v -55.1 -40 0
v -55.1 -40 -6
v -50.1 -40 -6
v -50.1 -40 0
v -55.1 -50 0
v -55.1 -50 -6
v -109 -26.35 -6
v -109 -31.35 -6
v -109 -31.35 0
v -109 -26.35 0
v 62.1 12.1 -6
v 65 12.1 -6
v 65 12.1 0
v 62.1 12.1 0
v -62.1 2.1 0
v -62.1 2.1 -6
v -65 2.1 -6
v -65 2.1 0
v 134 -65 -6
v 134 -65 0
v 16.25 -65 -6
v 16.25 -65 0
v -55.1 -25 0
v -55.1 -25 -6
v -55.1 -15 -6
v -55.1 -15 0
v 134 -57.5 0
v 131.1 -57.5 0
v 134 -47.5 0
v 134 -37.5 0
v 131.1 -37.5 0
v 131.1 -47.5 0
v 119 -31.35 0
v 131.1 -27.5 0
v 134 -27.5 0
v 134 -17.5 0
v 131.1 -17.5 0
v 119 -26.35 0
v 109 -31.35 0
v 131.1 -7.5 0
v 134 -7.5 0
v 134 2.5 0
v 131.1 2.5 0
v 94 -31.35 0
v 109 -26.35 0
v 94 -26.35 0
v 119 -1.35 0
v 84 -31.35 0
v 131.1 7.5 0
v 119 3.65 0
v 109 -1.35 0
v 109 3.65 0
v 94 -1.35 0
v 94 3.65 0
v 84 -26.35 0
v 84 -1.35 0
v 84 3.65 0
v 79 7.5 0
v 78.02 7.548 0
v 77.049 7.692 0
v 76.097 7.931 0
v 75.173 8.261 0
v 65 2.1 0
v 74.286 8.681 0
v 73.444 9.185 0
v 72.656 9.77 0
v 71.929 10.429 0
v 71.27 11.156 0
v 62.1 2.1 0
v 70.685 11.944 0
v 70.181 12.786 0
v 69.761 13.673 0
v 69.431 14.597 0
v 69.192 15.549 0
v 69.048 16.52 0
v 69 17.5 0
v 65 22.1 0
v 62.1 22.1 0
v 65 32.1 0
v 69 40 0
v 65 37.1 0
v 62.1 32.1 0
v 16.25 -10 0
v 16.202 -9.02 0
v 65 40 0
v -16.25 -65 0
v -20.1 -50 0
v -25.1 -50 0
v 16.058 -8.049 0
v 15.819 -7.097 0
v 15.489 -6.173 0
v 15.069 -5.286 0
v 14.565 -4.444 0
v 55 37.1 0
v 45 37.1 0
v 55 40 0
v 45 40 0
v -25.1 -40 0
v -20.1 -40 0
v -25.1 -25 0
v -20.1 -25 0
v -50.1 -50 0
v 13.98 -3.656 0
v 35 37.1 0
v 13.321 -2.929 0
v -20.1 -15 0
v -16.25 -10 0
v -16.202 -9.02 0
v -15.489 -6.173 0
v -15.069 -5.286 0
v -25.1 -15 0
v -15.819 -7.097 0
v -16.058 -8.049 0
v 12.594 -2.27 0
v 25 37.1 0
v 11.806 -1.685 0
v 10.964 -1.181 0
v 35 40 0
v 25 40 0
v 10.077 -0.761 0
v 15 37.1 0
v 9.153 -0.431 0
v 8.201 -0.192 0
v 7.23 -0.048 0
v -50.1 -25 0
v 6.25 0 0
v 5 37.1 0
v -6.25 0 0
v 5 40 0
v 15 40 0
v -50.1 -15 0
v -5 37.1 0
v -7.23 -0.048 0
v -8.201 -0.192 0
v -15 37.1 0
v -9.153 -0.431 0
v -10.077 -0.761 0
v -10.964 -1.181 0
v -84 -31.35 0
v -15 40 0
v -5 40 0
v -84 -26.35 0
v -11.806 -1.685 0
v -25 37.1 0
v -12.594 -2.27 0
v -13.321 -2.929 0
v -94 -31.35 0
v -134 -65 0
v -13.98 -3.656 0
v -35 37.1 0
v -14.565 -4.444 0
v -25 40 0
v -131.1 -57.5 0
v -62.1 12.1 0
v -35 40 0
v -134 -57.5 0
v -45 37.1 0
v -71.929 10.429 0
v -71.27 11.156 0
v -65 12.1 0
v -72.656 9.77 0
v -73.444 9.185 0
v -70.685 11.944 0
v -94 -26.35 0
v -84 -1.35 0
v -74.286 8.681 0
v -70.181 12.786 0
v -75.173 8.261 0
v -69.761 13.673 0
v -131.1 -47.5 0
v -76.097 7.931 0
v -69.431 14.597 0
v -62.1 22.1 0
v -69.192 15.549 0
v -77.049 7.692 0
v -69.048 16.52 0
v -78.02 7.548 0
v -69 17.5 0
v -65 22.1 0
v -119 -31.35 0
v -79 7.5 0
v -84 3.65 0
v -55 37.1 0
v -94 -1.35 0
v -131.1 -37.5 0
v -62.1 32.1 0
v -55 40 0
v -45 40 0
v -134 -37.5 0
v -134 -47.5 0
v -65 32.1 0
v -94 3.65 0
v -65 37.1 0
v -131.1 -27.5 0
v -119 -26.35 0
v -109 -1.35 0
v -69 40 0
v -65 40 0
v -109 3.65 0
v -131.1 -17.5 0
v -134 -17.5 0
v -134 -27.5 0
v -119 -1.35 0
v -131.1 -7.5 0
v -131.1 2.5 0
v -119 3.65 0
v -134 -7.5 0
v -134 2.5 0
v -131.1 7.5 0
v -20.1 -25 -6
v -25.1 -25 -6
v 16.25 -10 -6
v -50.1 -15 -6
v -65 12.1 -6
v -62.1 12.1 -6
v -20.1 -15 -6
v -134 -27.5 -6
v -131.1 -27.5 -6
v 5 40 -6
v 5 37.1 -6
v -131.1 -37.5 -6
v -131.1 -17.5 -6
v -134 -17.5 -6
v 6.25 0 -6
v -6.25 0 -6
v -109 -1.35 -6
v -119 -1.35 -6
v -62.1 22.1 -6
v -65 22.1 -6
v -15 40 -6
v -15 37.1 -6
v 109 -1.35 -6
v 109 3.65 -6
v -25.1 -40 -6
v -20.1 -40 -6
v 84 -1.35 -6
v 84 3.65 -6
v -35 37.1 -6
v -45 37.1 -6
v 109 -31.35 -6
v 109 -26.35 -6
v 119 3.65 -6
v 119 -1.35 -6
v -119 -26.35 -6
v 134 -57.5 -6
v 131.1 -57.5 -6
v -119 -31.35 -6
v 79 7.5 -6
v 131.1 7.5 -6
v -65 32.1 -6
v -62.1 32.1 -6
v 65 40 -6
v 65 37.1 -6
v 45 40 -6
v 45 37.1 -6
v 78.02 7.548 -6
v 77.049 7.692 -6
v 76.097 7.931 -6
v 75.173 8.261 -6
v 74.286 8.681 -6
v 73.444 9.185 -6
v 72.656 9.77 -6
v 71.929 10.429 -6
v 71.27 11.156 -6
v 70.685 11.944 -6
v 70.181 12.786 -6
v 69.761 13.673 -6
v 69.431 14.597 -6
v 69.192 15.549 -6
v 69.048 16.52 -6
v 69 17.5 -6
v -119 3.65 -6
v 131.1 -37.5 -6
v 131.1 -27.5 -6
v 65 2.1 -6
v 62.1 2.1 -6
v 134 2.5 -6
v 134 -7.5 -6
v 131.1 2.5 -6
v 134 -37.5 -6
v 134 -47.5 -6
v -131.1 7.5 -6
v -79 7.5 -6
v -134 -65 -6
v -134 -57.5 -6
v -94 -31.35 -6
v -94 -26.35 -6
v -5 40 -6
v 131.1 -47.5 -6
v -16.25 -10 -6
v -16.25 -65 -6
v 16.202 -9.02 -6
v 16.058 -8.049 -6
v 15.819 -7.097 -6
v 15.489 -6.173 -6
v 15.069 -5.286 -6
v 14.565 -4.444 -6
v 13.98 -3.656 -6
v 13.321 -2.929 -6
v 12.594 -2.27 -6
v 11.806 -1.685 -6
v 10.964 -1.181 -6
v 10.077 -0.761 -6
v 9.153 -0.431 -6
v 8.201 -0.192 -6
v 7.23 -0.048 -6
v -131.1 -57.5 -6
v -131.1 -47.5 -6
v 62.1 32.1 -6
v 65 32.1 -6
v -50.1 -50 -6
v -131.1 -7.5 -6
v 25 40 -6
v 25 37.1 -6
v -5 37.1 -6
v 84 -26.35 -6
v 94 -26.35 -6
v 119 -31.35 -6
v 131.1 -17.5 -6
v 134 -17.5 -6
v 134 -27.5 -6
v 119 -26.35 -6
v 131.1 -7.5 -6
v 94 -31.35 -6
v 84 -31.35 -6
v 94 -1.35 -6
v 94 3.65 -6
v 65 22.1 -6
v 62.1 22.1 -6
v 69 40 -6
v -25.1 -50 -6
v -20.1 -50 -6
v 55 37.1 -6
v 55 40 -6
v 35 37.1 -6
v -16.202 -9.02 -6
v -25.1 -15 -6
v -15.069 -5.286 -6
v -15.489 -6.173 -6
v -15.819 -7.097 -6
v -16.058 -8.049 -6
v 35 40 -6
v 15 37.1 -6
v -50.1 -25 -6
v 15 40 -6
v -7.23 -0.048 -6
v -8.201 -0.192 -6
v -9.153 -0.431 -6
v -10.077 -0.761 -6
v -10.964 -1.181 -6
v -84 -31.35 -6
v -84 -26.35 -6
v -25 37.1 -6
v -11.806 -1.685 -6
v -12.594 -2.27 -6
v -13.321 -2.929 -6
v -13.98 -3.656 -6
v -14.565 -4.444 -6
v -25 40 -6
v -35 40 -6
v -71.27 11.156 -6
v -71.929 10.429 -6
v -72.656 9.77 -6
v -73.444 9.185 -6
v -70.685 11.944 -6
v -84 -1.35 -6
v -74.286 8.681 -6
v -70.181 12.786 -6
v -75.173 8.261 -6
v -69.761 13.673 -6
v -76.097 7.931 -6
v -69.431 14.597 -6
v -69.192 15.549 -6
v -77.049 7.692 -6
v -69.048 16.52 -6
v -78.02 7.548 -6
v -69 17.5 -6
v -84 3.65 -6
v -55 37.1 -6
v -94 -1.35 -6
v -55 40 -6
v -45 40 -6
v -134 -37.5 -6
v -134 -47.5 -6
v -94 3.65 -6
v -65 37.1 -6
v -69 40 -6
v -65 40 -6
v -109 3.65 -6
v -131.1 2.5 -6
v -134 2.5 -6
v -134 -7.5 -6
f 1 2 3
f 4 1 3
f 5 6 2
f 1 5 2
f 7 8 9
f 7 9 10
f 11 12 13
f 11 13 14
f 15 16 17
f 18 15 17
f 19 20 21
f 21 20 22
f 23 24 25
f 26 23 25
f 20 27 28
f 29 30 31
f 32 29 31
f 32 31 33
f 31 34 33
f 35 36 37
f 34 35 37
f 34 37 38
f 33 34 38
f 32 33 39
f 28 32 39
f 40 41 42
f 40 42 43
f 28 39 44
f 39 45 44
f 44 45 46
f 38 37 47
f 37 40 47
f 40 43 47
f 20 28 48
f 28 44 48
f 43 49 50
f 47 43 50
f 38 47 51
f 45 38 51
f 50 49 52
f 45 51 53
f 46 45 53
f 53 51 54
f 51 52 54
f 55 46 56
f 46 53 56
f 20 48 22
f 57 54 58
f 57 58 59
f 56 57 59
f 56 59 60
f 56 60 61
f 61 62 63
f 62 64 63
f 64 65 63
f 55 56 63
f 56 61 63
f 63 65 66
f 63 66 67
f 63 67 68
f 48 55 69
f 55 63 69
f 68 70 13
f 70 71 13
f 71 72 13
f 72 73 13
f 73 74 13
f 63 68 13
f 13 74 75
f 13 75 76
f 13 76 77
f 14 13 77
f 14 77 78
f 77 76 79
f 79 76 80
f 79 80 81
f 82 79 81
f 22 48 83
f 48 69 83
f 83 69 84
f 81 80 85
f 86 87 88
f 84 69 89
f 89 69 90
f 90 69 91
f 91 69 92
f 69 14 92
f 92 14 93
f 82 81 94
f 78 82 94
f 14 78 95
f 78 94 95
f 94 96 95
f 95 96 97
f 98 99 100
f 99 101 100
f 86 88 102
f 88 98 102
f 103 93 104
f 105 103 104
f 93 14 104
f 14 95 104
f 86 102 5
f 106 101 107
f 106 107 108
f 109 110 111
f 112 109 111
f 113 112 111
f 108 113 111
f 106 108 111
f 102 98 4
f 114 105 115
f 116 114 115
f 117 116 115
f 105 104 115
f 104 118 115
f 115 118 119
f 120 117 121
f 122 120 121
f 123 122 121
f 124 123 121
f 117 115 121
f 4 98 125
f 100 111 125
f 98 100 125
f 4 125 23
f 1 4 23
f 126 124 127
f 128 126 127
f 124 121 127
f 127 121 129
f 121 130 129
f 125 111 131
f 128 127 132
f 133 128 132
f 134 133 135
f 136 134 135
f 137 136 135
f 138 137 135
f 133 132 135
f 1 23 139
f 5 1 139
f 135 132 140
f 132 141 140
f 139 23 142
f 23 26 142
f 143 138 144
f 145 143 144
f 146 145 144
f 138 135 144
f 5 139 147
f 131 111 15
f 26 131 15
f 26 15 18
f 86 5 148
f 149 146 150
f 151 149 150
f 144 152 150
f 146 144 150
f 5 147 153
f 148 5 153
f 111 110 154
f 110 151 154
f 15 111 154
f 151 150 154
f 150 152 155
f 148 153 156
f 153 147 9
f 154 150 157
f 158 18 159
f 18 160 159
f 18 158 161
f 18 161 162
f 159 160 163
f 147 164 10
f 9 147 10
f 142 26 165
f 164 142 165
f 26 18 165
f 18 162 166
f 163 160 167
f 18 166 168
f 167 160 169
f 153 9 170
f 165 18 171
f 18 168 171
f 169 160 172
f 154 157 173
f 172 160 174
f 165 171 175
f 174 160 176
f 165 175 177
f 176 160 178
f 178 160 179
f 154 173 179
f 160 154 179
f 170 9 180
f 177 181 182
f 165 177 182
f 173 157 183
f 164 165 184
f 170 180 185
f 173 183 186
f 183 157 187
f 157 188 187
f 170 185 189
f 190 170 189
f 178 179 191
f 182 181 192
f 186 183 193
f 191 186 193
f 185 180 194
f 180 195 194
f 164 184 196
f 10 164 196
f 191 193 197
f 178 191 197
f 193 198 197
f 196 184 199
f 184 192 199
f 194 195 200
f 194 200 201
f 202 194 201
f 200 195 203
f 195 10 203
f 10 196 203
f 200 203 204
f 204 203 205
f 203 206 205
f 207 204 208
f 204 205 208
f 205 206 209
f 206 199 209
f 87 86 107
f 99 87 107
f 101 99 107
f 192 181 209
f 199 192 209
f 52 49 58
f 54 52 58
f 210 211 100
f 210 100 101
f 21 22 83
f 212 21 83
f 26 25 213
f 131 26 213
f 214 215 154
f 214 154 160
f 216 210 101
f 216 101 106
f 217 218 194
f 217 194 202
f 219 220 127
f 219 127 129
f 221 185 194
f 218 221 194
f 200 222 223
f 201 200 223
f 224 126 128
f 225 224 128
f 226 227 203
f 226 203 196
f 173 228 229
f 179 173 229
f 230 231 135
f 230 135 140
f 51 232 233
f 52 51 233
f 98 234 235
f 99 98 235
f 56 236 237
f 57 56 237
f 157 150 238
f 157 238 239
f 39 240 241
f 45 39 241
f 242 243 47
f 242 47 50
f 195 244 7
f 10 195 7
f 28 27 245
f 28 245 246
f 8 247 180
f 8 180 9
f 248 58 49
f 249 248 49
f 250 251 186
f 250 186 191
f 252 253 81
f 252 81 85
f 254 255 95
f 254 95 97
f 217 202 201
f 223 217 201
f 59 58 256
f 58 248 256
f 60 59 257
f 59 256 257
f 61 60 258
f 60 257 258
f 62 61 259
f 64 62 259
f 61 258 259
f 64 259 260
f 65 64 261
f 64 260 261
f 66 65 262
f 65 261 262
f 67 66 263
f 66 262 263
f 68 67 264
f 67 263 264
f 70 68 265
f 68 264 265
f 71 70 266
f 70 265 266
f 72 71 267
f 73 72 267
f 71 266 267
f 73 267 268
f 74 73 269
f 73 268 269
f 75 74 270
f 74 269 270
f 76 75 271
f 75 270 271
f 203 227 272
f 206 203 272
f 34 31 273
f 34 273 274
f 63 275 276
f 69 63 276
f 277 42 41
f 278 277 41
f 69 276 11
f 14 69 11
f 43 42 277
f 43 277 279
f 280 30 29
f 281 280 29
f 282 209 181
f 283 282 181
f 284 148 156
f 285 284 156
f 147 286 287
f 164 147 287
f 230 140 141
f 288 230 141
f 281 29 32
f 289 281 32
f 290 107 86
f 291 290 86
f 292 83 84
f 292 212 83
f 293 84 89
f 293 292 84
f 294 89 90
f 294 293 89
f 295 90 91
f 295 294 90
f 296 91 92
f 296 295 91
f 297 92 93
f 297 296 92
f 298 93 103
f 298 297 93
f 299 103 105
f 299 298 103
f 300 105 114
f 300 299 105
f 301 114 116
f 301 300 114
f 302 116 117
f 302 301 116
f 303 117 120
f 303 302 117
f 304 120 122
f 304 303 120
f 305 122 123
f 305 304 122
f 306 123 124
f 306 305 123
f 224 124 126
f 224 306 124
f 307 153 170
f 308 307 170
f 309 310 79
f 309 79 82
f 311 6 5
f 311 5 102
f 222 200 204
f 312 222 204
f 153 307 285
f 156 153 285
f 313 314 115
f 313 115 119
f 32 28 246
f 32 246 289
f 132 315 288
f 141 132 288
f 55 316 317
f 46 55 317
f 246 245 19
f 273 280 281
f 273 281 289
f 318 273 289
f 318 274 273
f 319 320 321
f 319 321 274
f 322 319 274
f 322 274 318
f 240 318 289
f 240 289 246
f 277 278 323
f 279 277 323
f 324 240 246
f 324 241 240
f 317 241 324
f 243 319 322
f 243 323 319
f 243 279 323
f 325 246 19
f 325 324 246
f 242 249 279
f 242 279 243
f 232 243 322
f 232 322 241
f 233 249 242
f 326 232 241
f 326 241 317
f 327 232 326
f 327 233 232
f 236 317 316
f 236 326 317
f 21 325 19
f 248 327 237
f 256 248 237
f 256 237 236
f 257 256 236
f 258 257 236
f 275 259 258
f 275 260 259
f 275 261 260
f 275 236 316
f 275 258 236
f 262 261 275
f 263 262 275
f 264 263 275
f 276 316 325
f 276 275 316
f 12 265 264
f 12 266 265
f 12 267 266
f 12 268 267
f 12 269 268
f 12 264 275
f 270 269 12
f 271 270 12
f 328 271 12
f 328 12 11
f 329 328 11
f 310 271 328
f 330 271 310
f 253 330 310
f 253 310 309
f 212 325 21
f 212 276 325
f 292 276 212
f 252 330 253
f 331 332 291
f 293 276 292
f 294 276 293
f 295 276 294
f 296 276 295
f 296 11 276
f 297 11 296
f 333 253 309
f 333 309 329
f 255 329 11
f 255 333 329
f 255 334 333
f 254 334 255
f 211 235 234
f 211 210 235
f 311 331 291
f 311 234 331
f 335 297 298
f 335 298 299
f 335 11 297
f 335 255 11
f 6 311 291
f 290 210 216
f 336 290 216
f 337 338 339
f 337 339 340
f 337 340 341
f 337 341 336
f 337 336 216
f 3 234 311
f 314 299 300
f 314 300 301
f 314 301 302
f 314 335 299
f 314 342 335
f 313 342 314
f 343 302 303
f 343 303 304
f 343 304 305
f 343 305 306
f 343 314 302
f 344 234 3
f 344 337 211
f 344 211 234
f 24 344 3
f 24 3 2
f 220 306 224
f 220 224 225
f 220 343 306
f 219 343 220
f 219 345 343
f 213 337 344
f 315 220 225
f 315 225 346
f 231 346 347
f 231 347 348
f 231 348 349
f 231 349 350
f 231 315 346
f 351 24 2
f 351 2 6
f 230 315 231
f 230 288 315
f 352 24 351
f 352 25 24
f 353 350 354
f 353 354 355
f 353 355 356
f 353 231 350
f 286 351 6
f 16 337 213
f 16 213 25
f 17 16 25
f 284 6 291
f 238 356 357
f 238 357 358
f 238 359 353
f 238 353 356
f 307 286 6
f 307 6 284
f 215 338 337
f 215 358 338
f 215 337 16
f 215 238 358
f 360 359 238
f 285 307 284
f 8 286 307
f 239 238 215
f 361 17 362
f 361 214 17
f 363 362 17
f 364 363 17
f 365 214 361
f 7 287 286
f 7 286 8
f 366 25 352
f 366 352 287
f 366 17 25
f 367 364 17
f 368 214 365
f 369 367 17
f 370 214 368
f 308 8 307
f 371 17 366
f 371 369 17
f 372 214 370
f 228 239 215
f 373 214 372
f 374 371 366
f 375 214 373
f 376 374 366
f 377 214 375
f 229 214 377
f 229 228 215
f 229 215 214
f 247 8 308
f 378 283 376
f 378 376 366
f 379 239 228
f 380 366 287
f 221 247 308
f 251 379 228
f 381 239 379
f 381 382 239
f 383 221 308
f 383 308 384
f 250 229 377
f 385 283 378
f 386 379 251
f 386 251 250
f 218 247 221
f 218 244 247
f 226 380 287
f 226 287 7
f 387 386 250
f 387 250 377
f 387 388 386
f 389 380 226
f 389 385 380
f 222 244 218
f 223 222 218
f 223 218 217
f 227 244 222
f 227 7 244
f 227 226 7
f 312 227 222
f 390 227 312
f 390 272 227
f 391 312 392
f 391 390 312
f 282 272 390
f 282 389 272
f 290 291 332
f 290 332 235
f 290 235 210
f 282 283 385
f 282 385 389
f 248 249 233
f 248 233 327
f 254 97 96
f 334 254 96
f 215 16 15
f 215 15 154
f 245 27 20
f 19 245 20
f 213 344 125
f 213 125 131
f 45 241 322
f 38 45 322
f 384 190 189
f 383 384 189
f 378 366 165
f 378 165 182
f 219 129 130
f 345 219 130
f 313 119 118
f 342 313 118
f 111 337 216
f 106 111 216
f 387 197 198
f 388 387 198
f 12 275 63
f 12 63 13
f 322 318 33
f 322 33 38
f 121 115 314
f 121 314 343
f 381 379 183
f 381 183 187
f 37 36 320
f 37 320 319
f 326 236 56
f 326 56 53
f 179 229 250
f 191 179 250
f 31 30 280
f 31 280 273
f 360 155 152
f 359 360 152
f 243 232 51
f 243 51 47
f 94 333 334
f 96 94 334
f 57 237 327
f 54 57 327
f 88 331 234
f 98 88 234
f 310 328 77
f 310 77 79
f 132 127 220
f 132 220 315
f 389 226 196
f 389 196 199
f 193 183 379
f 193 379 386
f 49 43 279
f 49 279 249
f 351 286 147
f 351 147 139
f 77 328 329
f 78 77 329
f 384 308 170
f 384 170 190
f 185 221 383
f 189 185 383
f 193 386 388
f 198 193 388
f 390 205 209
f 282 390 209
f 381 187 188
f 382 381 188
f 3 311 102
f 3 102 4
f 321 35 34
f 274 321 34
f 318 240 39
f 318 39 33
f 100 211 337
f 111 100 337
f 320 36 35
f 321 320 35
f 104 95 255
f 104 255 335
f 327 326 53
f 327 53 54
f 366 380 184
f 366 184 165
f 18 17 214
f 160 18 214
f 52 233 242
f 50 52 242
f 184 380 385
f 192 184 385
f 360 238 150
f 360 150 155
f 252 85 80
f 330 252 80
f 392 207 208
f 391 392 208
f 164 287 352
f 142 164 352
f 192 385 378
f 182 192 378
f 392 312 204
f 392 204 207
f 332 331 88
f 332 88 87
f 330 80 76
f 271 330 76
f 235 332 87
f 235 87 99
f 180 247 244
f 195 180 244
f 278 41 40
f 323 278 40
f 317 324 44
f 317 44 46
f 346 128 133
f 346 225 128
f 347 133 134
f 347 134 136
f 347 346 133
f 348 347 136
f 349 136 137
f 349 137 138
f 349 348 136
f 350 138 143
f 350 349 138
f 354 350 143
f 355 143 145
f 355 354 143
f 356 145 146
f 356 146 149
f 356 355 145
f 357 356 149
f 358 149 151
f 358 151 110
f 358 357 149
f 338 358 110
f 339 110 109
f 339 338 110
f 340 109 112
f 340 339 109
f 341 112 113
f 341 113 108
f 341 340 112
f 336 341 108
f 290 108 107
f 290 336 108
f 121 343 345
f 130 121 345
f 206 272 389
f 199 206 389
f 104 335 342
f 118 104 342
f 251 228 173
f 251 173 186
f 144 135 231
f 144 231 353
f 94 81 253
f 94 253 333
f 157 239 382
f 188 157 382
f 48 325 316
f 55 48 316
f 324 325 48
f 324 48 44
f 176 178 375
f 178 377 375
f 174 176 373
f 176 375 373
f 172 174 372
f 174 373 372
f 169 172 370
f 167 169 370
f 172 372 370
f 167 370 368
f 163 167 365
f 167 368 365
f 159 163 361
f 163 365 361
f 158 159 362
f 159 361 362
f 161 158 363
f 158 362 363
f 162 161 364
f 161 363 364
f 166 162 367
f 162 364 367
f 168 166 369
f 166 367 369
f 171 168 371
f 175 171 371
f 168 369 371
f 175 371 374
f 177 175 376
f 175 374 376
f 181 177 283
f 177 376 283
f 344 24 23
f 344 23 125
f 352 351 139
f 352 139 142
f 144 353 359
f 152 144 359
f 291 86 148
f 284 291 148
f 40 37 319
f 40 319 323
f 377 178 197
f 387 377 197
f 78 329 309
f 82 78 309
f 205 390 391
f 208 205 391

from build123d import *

# Parameters (mm, degrees)
BOSS_EXTRUDE1_DEPTH     = 6
CUT_EXTRUDE1_DEPTH      = 150.053681605
CUT_EXTRUDE1_DEPTH_BACK = 150.053681605
SKETCH2_W               = 10
SKETCH2_H               = 5
SKETCH2_W_2             = 5
SKETCH2_H_2             = 10
FILLET1_R               = 10
CUT_EXTRUDE2_DEPTH      = 150.053681605
CUT_EXTRUDE2_DEPTH_BACK = 150.053681605
SKETCH3_W               = 10
SKETCH3_H               = 2.9
SKETCH3_W_2             = 2.9
SKETCH3_H_2             = 10
SKETCH4_W               = 2.9
SKETCH4_H               = 10
CUT_EXTRUDE3_DEPTH      = 150.053681605


with BuildPart() as part:
    # Sketch1 → Boss-Extrude1 (new body)
    with BuildSketch(Plane.XY):
        Polygon((134, -65), (16.25, -65), (16.25, 0), (-16.25, 0), (-16.25, -65), (-134, -65), (-134, 7.5), (-69, 7.5), (-69, 40), (69, 40), (69, 7.5), (134, 7.5), align=None)
    extrude(amount=-BOSS_EXTRUDE1_DEPTH)

    # Sketch2 → Cut-Extrude1 (cut, two sides: drawn at the far end of the back side and taken through both)
    with BuildSketch(Plane.XY.offset(-CUT_EXTRUDE1_DEPTH_BACK)):
        with Locations((-114, 1.15)):
            Rectangle(SKETCH2_W, SKETCH2_H)
        with Locations((-114, -28.85)):
            Rectangle(SKETCH2_W, SKETCH2_H)
        with Locations((-89, -28.85)):
            Rectangle(SKETCH2_W, SKETCH2_H)
        with Locations((-89, 1.15)):
            Rectangle(SKETCH2_W, SKETCH2_H)
        with Locations((-52.6, -20)):
            Rectangle(SKETCH2_W_2, SKETCH2_H_2)
        with Locations((-22.6, -20)):
            Rectangle(SKETCH2_W_2, SKETCH2_H_2)
        with Locations((-52.6, -45)):
            Rectangle(SKETCH2_W_2, SKETCH2_H_2)
        with Locations((-22.6, -45)):
            Rectangle(SKETCH2_W_2, SKETCH2_H_2)
        with Locations((89, -28.85)):
            Rectangle(SKETCH2_W, SKETCH2_H)
        with Locations((114, -28.85)):
            Rectangle(SKETCH2_W, SKETCH2_H)
        with Locations((114, 1.15)):
            Rectangle(SKETCH2_W, SKETCH2_H)
        with Locations((89, 1.15)):
            Rectangle(SKETCH2_W, SKETCH2_H)
    extrude(amount=CUT_EXTRUDE1_DEPTH + CUT_EXTRUDE1_DEPTH_BACK, mode=Mode.SUBTRACT)

    # Fillet1
    fillet1_edges = [part.edges().sort_by_distance(p)[0] for p in [
        (16.25, 0, -3),
        (-16.25, 0, -3),
        (-69, 7.5, -3),
        (69, 7.5, -3),
    ]]
    fillet(fillet1_edges, radius=FILLET1_R)

    # Sketch3 → Cut-Extrude2 (cut, two sides: drawn at the far end of the back side and taken through both)
    with BuildSketch(Plane(origin=(0, 0, -6), x_dir=(-1, 0, 0), z_dir=(0, 0, -1)).offset(-CUT_EXTRUDE2_DEPTH_BACK)):
        with Locations((0, 38.55)):
            Rectangle(SKETCH3_W, SKETCH3_H)
        with Locations((20, 38.55)):
            Rectangle(SKETCH3_W, SKETCH3_H)
        with Locations((40, 38.55)):
            Rectangle(SKETCH3_W, SKETCH3_H)
        with Locations((60, 38.55)):
            Rectangle(SKETCH3_W, SKETCH3_H)
        with Locations((-20, 38.55)):
            Rectangle(SKETCH3_W, SKETCH3_H)
        with Locations((-40, 38.55)):
            Rectangle(SKETCH3_W, SKETCH3_H)
        with Locations((-60, 38.55)):
            Rectangle(SKETCH3_W, SKETCH3_H)
        with Locations((-132.55, -12.5)):
            Rectangle(SKETCH3_W_2, SKETCH3_H_2)
        with Locations((-132.55, 7.5)):
            Rectangle(SKETCH3_W_2, SKETCH3_H_2)
        with Locations((-132.55, -32.5)):
            Rectangle(SKETCH3_W_2, SKETCH3_H_2)
        with Locations((-132.55, -52.5)):
            Rectangle(SKETCH3_W_2, SKETCH3_H_2)
        with Locations((132.55, -52.5)):
            Rectangle(SKETCH3_W_2, SKETCH3_H_2)
        with Locations((132.55, -32.5)):
            Rectangle(SKETCH3_W_2, SKETCH3_H_2)
        with Locations((132.55, -12.5)):
            Rectangle(SKETCH3_W_2, SKETCH3_H_2)
        with Locations((132.55, 7.5)):
            Rectangle(SKETCH3_W_2, SKETCH3_H_2)
    extrude(amount=CUT_EXTRUDE2_DEPTH + CUT_EXTRUDE2_DEPTH_BACK, mode=Mode.SUBTRACT)

    # Sketch4 → Cut-Extrude3 (cut, through all)
    with BuildSketch(Plane(origin=(0, 0, -6), x_dir=(-1, 0, 0), z_dir=(0, 0, -1))):
        with Locations((63.55, 27.1)):
            Rectangle(SKETCH4_W, SKETCH4_H)
        with Locations((63.55, 7.1)):
            Rectangle(SKETCH4_W, SKETCH4_H)
        with Locations((-63.55, 7.1)):
            Rectangle(SKETCH4_W, SKETCH4_H)
        with Locations((-63.55, 27.1)):
            Rectangle(SKETCH4_W, SKETCH4_H)
    extrude(amount=-CUT_EXTRUDE3_DEPTH, mode=Mode.SUBTRACT)


solid = part.part
